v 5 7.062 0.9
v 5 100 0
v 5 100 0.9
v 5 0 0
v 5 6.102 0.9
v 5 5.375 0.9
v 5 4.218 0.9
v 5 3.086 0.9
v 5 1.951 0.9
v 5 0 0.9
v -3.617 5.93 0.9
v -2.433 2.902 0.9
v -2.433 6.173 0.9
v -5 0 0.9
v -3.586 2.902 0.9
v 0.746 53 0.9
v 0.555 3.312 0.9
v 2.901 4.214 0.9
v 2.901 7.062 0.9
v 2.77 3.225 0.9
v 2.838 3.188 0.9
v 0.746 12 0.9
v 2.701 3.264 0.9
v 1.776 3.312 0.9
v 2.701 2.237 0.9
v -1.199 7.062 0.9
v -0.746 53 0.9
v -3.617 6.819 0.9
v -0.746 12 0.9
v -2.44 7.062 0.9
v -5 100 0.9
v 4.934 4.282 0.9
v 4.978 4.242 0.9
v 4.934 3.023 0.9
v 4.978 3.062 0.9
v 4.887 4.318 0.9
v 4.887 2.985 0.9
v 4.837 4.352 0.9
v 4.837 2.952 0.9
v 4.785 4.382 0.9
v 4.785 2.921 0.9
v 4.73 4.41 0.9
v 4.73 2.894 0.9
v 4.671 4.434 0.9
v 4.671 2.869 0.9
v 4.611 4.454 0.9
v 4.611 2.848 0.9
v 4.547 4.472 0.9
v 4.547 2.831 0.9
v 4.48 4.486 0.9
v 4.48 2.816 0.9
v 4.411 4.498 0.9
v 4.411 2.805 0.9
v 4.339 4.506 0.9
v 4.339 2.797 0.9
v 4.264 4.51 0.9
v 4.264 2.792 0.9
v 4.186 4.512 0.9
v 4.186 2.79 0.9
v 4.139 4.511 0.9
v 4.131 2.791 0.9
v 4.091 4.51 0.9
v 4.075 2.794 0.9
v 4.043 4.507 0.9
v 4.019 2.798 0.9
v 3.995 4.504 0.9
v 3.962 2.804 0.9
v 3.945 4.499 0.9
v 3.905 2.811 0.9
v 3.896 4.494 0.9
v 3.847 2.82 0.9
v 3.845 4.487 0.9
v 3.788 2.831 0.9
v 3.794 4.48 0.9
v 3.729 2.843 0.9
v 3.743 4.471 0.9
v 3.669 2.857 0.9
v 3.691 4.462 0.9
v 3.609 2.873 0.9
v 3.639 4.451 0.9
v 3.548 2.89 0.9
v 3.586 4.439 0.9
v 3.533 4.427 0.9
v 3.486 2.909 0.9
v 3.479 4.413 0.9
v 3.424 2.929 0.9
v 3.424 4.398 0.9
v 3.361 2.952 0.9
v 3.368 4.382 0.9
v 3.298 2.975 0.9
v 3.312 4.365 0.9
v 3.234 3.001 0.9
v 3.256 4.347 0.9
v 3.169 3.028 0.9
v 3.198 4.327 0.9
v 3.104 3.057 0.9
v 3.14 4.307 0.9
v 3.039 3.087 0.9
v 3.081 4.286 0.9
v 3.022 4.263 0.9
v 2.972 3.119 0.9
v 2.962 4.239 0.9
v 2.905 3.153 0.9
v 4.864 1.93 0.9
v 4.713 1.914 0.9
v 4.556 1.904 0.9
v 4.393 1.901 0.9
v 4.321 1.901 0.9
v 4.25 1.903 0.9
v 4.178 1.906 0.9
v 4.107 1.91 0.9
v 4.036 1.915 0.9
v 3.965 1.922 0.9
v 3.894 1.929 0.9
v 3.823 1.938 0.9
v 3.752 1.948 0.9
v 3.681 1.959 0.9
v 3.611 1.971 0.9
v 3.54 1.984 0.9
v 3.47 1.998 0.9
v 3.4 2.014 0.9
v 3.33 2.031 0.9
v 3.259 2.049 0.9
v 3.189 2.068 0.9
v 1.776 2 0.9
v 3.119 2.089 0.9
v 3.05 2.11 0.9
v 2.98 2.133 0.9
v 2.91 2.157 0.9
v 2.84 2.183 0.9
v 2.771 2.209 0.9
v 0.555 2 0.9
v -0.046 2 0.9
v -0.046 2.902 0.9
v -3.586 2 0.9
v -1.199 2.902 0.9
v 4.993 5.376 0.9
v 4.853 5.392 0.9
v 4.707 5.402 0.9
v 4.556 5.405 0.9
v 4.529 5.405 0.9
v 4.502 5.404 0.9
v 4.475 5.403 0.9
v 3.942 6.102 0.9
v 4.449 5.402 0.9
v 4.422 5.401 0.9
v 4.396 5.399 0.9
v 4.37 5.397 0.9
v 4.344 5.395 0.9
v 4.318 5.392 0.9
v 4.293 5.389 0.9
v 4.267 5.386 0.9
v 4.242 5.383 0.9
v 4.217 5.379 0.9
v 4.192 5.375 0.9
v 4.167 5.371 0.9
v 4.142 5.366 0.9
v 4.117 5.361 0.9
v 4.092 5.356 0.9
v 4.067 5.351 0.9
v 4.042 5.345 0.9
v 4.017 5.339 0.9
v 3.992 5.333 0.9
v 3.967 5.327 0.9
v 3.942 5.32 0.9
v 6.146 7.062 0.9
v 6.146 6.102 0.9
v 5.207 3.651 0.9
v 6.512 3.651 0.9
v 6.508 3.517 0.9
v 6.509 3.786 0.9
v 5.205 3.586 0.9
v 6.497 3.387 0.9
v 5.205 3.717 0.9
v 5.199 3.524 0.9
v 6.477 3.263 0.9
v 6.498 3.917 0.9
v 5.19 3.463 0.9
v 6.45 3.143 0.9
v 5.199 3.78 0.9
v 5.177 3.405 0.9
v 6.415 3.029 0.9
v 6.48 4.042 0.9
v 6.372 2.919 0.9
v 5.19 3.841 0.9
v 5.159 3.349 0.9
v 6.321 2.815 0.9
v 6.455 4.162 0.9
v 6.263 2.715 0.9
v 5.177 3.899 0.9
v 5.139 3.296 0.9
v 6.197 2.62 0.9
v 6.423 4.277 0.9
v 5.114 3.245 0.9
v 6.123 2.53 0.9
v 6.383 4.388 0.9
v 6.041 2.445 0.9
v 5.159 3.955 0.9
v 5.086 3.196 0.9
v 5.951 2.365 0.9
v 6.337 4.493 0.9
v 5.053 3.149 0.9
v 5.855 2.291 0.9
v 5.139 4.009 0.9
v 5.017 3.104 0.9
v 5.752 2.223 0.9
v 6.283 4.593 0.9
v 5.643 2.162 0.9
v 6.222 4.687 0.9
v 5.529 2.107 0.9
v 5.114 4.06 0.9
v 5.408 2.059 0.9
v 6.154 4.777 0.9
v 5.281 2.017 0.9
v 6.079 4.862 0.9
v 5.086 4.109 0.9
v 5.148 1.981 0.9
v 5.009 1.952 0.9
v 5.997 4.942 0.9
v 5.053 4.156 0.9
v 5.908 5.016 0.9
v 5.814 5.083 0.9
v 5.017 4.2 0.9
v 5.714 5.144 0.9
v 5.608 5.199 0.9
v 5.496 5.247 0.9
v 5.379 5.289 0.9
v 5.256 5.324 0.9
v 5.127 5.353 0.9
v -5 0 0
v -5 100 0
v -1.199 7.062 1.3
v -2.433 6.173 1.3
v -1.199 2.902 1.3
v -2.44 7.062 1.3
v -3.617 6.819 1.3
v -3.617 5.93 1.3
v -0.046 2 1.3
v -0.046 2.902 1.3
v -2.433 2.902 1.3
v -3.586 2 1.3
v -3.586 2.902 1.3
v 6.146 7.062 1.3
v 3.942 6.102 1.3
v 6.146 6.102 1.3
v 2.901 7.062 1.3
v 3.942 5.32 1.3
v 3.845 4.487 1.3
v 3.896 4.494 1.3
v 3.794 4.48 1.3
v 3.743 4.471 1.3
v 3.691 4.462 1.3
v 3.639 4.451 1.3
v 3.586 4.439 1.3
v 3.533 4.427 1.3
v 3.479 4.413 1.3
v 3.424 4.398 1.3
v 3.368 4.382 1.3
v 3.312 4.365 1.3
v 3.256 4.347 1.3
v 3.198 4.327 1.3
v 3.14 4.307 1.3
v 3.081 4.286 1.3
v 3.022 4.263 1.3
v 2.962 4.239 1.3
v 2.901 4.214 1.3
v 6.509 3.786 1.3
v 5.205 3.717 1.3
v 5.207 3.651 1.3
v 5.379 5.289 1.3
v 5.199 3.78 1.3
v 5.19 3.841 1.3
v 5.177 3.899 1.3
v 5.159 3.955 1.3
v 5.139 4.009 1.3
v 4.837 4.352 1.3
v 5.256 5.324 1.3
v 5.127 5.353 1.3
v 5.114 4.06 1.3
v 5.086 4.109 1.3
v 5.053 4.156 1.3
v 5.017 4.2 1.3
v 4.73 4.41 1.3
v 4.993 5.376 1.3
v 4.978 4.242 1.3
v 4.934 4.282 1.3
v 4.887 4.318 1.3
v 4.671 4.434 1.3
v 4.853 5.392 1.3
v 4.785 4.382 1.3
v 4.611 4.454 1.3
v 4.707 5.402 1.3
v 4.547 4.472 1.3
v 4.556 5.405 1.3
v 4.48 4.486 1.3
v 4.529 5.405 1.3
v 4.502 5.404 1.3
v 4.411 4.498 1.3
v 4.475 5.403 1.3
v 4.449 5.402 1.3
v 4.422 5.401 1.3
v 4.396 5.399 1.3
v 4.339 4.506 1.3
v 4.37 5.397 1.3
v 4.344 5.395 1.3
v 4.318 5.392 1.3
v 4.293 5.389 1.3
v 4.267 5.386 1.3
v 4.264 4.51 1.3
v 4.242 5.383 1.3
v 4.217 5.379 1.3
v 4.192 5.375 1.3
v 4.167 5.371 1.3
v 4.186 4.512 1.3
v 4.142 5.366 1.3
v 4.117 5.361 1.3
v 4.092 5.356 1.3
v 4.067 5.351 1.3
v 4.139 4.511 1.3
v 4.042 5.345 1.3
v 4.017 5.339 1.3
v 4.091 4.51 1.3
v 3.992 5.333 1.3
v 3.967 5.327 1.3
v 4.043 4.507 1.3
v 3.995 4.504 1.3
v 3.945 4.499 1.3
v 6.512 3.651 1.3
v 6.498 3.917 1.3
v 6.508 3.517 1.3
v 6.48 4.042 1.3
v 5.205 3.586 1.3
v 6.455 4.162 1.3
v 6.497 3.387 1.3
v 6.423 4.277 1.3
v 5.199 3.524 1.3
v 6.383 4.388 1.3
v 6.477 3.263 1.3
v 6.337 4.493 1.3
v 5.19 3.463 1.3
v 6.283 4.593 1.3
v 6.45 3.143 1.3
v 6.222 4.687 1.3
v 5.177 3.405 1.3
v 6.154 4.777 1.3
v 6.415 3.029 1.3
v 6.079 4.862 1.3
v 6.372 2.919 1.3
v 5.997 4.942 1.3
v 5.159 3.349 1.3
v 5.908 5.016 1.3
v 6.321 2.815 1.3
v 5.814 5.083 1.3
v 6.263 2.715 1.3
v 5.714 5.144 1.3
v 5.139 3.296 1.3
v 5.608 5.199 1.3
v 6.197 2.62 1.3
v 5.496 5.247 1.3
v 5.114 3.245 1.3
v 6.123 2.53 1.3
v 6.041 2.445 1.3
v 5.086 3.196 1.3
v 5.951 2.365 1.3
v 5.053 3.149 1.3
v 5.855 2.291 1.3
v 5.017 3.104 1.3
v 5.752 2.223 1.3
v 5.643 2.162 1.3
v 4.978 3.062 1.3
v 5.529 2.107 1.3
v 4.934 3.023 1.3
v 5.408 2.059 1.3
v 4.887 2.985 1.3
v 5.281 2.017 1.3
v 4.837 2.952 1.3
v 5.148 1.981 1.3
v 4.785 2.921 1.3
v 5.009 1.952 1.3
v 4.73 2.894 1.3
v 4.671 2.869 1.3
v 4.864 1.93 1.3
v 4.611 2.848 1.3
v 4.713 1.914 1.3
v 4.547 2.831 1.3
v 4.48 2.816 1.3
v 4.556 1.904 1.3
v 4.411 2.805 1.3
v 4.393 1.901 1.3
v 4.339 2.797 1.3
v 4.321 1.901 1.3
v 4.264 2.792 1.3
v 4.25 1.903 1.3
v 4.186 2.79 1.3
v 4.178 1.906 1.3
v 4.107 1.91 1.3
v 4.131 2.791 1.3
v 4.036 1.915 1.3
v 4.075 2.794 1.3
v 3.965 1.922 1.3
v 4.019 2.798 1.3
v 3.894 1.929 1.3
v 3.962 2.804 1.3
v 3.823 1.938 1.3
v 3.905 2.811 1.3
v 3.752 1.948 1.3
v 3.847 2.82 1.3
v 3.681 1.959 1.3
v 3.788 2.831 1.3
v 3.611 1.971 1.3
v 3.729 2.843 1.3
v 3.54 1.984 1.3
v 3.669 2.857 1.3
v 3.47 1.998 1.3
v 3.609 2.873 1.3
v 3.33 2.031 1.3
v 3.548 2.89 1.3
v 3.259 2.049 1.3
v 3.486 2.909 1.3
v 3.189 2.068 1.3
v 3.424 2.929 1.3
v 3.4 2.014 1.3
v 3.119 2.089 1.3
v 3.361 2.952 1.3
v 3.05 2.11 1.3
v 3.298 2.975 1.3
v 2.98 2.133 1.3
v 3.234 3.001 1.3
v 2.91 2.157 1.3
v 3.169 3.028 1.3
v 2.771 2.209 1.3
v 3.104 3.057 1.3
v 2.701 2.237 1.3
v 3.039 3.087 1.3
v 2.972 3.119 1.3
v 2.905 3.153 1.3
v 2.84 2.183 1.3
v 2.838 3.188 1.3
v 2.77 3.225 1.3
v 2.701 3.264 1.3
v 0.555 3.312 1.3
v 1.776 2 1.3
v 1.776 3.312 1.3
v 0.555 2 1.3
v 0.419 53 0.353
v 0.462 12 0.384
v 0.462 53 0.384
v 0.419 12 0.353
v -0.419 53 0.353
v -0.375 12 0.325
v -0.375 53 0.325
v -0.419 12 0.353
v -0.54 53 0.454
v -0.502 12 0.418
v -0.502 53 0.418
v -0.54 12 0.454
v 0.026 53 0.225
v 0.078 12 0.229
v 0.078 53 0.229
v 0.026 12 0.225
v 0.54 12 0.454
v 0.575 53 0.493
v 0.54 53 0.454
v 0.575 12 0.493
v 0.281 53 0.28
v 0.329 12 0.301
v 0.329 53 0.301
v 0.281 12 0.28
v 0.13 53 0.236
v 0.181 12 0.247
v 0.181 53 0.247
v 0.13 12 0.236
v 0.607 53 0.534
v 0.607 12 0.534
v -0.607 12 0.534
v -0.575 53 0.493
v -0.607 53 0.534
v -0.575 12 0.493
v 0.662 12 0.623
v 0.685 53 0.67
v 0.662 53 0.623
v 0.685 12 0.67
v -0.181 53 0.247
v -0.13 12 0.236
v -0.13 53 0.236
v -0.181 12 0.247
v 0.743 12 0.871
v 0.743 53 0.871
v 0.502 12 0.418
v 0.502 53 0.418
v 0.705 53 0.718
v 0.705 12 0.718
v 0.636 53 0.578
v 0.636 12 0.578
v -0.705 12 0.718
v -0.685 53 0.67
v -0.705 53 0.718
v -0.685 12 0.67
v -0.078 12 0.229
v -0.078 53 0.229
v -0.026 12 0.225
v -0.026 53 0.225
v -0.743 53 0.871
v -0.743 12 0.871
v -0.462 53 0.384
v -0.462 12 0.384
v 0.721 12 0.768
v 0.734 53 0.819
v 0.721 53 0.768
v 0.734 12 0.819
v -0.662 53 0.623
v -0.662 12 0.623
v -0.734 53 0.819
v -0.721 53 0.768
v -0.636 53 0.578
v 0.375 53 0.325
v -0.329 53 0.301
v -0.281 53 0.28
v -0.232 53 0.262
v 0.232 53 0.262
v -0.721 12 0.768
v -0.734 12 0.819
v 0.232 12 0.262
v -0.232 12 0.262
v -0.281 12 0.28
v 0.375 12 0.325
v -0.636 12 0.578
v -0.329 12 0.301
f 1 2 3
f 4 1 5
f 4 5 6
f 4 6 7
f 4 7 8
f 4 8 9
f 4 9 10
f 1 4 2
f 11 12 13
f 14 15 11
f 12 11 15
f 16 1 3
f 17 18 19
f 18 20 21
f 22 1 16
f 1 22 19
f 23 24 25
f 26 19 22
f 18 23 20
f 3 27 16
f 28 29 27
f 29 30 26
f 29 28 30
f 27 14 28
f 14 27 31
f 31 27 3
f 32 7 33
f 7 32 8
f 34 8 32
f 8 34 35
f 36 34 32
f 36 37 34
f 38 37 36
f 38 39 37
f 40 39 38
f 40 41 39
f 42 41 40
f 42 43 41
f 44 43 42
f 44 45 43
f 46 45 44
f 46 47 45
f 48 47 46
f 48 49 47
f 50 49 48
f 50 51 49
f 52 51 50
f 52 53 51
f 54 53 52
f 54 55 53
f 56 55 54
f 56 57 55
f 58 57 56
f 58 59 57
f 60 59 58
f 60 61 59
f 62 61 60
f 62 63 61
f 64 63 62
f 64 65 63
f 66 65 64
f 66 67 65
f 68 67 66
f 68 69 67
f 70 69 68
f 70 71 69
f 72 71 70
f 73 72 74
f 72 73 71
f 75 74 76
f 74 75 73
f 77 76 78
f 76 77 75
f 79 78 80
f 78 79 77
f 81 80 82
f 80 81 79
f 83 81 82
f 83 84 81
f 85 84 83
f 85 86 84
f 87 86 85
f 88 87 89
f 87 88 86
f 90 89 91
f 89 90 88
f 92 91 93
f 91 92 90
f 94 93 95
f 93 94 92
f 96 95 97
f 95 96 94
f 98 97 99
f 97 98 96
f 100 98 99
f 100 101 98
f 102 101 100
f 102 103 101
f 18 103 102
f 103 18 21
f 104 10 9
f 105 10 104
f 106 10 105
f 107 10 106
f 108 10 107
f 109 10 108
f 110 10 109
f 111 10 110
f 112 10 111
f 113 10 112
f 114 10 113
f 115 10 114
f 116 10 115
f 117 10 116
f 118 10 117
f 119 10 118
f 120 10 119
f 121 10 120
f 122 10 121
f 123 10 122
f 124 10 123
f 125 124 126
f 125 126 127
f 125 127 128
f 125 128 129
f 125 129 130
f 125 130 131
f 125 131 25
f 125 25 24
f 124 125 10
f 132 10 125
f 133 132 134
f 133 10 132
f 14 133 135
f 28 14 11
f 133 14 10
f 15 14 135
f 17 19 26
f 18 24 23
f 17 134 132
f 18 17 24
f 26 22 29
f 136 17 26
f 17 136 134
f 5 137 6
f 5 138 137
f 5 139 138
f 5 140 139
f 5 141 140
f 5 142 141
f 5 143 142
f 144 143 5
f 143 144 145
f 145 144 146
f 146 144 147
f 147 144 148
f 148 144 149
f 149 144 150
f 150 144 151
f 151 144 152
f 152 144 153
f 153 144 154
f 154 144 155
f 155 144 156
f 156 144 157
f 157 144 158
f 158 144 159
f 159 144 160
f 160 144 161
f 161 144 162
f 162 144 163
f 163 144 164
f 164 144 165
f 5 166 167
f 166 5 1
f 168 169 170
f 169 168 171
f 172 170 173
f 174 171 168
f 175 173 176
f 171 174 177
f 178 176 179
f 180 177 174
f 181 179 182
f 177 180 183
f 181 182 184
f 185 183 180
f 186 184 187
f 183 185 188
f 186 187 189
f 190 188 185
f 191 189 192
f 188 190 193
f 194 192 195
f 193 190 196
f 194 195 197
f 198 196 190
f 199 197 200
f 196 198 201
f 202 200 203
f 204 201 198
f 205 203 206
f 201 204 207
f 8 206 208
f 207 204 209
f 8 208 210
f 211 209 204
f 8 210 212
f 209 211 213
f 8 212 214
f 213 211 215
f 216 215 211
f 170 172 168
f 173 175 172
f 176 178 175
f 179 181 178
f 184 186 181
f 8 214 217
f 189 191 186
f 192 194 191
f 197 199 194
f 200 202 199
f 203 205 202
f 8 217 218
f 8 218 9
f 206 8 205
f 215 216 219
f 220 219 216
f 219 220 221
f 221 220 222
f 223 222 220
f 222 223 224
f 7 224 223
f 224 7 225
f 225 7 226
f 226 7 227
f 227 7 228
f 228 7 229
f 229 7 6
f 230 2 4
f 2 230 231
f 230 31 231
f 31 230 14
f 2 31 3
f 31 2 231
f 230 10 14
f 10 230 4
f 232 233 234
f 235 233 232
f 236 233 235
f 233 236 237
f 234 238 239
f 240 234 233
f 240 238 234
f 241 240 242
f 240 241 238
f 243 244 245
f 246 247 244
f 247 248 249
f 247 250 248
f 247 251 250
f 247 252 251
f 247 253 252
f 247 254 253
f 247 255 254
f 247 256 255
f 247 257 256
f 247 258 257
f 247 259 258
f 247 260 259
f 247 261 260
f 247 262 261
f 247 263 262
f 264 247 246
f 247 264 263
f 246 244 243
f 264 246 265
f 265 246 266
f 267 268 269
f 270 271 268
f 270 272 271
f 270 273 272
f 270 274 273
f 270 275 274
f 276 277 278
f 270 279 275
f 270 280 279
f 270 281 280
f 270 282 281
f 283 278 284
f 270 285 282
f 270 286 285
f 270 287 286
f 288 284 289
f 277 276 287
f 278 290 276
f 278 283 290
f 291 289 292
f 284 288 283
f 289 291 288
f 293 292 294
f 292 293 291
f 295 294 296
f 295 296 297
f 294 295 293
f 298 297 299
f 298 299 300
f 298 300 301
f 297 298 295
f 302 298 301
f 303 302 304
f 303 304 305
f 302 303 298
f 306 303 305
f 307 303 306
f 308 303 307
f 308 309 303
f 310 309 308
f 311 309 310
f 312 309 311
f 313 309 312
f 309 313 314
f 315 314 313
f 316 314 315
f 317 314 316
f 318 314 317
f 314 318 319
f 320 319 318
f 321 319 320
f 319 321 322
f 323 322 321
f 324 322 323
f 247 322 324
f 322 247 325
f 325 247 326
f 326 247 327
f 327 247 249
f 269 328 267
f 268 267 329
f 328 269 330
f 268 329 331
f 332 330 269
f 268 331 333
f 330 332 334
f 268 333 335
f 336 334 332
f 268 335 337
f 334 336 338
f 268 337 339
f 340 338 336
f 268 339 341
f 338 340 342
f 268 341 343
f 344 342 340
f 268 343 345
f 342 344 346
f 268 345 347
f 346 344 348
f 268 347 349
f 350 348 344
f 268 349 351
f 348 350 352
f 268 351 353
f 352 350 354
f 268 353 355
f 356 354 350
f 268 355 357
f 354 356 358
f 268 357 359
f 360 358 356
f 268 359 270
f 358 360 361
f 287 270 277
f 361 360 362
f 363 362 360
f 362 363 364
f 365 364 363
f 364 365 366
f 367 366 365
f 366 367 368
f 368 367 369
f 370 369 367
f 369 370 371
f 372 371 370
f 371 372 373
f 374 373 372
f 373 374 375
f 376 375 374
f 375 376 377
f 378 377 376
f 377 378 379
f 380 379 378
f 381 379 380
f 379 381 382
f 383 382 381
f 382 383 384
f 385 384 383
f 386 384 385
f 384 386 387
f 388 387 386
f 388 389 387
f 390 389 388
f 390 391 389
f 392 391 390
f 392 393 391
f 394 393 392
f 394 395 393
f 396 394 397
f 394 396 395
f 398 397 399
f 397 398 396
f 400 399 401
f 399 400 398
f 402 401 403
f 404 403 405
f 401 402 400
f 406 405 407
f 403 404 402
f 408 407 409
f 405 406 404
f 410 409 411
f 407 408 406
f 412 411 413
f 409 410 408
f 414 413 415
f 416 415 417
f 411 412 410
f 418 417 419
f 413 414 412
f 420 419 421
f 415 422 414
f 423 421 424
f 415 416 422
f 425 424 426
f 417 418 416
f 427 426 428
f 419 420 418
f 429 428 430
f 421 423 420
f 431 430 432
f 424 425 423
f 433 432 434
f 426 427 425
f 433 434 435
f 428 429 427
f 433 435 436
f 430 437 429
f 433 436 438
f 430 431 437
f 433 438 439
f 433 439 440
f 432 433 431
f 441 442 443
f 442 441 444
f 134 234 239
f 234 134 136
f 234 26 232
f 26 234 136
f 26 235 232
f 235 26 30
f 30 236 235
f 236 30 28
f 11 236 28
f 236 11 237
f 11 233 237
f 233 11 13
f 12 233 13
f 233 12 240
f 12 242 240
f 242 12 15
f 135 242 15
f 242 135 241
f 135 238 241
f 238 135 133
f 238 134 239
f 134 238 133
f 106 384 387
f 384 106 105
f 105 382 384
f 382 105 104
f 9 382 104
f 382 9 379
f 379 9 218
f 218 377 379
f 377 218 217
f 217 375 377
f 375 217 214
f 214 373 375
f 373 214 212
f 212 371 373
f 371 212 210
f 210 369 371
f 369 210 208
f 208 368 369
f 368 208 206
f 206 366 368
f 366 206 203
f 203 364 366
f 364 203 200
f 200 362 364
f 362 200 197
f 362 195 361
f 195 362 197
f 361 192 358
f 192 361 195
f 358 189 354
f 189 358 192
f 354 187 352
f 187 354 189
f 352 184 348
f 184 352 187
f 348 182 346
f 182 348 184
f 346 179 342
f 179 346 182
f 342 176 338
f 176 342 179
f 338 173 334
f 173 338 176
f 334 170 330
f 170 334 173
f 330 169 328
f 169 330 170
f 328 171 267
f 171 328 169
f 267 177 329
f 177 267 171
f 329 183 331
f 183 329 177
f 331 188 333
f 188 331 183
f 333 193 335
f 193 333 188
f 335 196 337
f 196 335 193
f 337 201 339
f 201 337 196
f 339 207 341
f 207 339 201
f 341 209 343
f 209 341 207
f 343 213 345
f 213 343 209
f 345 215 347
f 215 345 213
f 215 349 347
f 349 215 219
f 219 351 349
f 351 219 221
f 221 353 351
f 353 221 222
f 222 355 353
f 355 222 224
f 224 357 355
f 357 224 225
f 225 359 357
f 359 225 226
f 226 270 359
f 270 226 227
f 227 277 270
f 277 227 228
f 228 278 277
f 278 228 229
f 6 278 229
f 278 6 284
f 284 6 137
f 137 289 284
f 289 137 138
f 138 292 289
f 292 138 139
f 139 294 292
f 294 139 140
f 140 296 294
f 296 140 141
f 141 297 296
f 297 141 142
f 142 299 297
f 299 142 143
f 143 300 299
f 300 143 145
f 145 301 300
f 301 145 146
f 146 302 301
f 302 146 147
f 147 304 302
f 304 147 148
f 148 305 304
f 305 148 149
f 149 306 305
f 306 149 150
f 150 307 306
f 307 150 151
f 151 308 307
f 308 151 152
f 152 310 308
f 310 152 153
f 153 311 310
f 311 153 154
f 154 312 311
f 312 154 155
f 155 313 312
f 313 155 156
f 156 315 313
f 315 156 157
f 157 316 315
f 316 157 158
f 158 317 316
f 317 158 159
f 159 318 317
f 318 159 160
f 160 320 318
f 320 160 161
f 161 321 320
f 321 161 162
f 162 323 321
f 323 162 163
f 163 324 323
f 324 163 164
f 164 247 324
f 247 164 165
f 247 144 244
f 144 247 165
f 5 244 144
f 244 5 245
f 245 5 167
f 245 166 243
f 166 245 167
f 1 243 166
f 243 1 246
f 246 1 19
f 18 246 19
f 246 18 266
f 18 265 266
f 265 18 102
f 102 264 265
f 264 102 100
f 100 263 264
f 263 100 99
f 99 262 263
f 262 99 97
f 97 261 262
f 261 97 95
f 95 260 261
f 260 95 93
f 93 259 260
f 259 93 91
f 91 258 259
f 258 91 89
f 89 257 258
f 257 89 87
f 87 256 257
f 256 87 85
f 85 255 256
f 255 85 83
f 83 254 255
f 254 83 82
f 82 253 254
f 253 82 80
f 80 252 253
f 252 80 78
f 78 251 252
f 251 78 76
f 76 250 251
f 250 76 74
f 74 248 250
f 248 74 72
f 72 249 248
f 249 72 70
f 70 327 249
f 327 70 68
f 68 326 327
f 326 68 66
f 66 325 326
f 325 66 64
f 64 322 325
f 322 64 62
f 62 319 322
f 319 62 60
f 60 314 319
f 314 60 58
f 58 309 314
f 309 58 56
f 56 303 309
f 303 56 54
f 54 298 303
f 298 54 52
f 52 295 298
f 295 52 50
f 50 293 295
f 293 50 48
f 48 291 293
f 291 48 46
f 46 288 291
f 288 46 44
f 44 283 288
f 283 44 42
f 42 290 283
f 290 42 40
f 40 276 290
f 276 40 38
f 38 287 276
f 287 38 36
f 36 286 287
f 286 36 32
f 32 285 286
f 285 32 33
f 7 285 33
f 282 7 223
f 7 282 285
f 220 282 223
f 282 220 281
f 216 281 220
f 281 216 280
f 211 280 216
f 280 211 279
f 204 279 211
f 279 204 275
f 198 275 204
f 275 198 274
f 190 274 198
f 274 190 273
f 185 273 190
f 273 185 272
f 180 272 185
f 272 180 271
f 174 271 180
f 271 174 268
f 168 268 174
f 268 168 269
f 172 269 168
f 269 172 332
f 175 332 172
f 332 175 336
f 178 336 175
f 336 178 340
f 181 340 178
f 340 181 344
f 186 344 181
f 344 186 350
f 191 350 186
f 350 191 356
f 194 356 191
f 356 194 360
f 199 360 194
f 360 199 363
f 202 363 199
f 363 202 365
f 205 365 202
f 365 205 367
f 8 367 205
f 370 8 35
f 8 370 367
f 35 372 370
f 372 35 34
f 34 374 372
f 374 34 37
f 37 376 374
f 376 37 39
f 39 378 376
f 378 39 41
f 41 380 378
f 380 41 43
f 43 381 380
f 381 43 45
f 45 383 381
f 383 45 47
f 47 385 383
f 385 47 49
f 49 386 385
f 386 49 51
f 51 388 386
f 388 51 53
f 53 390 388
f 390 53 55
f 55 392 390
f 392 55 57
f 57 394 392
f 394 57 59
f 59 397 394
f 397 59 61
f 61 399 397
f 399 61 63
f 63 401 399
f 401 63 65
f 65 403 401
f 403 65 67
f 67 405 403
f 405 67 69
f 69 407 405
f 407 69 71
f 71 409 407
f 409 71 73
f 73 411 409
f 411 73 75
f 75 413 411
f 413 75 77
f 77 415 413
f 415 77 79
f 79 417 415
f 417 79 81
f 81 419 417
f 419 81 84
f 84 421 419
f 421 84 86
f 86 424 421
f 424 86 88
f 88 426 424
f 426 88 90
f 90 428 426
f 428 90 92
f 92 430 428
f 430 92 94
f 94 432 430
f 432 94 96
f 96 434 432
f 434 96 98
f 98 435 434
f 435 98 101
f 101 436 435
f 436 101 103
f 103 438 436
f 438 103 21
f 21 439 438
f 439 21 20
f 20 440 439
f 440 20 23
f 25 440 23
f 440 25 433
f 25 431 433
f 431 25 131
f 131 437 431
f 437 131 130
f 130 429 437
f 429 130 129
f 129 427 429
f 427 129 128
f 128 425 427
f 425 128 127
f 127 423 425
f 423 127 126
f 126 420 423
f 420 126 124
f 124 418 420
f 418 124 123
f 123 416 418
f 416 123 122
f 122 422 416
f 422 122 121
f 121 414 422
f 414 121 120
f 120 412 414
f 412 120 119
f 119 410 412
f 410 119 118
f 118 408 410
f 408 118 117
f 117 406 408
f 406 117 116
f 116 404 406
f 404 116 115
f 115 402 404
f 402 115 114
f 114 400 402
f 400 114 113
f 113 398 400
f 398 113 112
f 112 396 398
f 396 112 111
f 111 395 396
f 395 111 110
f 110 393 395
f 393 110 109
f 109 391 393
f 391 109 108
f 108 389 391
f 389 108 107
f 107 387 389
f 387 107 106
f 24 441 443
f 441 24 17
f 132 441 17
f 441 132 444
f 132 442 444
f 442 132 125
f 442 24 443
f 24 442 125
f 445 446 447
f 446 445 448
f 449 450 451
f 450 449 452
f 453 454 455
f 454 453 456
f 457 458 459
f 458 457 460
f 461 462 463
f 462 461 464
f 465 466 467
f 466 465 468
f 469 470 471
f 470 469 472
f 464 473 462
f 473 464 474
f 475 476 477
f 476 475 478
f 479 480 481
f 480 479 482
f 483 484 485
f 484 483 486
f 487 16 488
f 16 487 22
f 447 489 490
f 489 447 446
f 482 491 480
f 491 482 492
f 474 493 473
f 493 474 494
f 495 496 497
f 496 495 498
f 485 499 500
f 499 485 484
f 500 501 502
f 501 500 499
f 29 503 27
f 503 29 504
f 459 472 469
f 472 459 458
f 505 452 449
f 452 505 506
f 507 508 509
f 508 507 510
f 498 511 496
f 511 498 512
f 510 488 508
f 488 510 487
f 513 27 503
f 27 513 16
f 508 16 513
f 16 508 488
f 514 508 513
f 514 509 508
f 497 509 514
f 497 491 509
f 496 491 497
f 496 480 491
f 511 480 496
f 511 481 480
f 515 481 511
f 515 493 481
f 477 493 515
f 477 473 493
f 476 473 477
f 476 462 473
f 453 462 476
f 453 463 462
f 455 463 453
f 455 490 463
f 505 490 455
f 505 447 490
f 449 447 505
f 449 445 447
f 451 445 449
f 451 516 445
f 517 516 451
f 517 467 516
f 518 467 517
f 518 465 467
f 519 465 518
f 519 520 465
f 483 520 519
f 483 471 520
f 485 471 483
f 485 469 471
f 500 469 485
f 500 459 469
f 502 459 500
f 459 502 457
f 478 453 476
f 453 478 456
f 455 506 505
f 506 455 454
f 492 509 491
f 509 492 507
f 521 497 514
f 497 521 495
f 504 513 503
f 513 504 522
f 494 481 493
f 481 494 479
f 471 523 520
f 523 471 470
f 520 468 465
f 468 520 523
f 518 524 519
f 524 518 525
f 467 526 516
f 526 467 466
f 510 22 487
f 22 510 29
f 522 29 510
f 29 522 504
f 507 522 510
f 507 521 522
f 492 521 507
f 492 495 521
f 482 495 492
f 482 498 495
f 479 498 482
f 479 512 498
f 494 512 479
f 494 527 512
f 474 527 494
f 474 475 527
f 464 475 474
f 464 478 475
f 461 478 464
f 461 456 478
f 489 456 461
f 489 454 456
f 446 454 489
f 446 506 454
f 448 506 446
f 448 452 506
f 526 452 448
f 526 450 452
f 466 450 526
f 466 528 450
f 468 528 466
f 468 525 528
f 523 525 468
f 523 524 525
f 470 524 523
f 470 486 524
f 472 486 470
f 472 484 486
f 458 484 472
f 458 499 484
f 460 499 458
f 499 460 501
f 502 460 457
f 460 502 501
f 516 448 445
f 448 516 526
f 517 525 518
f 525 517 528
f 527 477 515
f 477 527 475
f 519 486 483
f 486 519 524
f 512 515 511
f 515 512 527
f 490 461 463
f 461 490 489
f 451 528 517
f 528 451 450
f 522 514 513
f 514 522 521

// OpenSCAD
// file: module/drill-bit-storage.scad
/*
    Drill bit storage
*/

$fn=90;  // accuracy


// Constants (Don't change)
storageLenght = 100; // Not Bit lenght
maxBitLenght  = 70;  // Check bit lenght
storageWidth  = 10;  // Minimum width

// Bit dependent
bitDiameter = 4.0;



module drillBitStorage (bitDiameter,maxBitLenght,
	storageWidth,storageLenght){

// Automatic Variables  (Don't change)
diameterText      = str(bitDiameter);
storageHight      = bitDiameter*0.6; 
bitRadius         = bitDiameter/2;
bitPositionHeight = storageHight+bitDiameter*0.05; 


// Delition for crating drill track
difference() {

// Union for text and storage
union(){

// Storage 
translate([
    -storageWidth/2,    // Centering
    0, 
    0
    ]) 
cube(size = [
    storageWidth,
    storageLenght,
    storageHight
    ]);

// Milimiter dimension text
translate([
    -4.4,               // Fine deling x-axis
    2,                  // Fine deling y-axis 
    storageHight         
    ])
linear_extrude(height=0.4)text(
    diameterText,  // Dynamic text
    size=5,
    font="tohoma:style=bold",
    spacing=0.9
    );
    
// End of union    
}  

// Begining of Delition
// Drill tracl
rotate([90,0,0])
translate([
    0,                   // x-axis
    bitPositionHeight,   // Z-axis
    -(maxBitLenght+12)    // y-axis
    ])  
cylinder(
    h = maxBitLenght,    // y-axis
    r = bitRadius        // x-axis 
    );      

// End of Delition
}}
// main file
/*
    Drill bit storage
*/

$fn=90;  // accuracy

// import module
use <module/drill-bit-storage.scad>;



// Tootale lenght of the unit
storageLenght = 100; 

// Width of the unit
storageWidth  = 10;  // (Constant under 4mm)  

// The lenght of the drill bit
maxBitLenght  = 41;  

// Drill bit diameter  
bitDiameter = 1.5;


// Call the module
drillBitStorage 
    (bitDiameter,maxBitLenght,storageWidth,storageLenght);
